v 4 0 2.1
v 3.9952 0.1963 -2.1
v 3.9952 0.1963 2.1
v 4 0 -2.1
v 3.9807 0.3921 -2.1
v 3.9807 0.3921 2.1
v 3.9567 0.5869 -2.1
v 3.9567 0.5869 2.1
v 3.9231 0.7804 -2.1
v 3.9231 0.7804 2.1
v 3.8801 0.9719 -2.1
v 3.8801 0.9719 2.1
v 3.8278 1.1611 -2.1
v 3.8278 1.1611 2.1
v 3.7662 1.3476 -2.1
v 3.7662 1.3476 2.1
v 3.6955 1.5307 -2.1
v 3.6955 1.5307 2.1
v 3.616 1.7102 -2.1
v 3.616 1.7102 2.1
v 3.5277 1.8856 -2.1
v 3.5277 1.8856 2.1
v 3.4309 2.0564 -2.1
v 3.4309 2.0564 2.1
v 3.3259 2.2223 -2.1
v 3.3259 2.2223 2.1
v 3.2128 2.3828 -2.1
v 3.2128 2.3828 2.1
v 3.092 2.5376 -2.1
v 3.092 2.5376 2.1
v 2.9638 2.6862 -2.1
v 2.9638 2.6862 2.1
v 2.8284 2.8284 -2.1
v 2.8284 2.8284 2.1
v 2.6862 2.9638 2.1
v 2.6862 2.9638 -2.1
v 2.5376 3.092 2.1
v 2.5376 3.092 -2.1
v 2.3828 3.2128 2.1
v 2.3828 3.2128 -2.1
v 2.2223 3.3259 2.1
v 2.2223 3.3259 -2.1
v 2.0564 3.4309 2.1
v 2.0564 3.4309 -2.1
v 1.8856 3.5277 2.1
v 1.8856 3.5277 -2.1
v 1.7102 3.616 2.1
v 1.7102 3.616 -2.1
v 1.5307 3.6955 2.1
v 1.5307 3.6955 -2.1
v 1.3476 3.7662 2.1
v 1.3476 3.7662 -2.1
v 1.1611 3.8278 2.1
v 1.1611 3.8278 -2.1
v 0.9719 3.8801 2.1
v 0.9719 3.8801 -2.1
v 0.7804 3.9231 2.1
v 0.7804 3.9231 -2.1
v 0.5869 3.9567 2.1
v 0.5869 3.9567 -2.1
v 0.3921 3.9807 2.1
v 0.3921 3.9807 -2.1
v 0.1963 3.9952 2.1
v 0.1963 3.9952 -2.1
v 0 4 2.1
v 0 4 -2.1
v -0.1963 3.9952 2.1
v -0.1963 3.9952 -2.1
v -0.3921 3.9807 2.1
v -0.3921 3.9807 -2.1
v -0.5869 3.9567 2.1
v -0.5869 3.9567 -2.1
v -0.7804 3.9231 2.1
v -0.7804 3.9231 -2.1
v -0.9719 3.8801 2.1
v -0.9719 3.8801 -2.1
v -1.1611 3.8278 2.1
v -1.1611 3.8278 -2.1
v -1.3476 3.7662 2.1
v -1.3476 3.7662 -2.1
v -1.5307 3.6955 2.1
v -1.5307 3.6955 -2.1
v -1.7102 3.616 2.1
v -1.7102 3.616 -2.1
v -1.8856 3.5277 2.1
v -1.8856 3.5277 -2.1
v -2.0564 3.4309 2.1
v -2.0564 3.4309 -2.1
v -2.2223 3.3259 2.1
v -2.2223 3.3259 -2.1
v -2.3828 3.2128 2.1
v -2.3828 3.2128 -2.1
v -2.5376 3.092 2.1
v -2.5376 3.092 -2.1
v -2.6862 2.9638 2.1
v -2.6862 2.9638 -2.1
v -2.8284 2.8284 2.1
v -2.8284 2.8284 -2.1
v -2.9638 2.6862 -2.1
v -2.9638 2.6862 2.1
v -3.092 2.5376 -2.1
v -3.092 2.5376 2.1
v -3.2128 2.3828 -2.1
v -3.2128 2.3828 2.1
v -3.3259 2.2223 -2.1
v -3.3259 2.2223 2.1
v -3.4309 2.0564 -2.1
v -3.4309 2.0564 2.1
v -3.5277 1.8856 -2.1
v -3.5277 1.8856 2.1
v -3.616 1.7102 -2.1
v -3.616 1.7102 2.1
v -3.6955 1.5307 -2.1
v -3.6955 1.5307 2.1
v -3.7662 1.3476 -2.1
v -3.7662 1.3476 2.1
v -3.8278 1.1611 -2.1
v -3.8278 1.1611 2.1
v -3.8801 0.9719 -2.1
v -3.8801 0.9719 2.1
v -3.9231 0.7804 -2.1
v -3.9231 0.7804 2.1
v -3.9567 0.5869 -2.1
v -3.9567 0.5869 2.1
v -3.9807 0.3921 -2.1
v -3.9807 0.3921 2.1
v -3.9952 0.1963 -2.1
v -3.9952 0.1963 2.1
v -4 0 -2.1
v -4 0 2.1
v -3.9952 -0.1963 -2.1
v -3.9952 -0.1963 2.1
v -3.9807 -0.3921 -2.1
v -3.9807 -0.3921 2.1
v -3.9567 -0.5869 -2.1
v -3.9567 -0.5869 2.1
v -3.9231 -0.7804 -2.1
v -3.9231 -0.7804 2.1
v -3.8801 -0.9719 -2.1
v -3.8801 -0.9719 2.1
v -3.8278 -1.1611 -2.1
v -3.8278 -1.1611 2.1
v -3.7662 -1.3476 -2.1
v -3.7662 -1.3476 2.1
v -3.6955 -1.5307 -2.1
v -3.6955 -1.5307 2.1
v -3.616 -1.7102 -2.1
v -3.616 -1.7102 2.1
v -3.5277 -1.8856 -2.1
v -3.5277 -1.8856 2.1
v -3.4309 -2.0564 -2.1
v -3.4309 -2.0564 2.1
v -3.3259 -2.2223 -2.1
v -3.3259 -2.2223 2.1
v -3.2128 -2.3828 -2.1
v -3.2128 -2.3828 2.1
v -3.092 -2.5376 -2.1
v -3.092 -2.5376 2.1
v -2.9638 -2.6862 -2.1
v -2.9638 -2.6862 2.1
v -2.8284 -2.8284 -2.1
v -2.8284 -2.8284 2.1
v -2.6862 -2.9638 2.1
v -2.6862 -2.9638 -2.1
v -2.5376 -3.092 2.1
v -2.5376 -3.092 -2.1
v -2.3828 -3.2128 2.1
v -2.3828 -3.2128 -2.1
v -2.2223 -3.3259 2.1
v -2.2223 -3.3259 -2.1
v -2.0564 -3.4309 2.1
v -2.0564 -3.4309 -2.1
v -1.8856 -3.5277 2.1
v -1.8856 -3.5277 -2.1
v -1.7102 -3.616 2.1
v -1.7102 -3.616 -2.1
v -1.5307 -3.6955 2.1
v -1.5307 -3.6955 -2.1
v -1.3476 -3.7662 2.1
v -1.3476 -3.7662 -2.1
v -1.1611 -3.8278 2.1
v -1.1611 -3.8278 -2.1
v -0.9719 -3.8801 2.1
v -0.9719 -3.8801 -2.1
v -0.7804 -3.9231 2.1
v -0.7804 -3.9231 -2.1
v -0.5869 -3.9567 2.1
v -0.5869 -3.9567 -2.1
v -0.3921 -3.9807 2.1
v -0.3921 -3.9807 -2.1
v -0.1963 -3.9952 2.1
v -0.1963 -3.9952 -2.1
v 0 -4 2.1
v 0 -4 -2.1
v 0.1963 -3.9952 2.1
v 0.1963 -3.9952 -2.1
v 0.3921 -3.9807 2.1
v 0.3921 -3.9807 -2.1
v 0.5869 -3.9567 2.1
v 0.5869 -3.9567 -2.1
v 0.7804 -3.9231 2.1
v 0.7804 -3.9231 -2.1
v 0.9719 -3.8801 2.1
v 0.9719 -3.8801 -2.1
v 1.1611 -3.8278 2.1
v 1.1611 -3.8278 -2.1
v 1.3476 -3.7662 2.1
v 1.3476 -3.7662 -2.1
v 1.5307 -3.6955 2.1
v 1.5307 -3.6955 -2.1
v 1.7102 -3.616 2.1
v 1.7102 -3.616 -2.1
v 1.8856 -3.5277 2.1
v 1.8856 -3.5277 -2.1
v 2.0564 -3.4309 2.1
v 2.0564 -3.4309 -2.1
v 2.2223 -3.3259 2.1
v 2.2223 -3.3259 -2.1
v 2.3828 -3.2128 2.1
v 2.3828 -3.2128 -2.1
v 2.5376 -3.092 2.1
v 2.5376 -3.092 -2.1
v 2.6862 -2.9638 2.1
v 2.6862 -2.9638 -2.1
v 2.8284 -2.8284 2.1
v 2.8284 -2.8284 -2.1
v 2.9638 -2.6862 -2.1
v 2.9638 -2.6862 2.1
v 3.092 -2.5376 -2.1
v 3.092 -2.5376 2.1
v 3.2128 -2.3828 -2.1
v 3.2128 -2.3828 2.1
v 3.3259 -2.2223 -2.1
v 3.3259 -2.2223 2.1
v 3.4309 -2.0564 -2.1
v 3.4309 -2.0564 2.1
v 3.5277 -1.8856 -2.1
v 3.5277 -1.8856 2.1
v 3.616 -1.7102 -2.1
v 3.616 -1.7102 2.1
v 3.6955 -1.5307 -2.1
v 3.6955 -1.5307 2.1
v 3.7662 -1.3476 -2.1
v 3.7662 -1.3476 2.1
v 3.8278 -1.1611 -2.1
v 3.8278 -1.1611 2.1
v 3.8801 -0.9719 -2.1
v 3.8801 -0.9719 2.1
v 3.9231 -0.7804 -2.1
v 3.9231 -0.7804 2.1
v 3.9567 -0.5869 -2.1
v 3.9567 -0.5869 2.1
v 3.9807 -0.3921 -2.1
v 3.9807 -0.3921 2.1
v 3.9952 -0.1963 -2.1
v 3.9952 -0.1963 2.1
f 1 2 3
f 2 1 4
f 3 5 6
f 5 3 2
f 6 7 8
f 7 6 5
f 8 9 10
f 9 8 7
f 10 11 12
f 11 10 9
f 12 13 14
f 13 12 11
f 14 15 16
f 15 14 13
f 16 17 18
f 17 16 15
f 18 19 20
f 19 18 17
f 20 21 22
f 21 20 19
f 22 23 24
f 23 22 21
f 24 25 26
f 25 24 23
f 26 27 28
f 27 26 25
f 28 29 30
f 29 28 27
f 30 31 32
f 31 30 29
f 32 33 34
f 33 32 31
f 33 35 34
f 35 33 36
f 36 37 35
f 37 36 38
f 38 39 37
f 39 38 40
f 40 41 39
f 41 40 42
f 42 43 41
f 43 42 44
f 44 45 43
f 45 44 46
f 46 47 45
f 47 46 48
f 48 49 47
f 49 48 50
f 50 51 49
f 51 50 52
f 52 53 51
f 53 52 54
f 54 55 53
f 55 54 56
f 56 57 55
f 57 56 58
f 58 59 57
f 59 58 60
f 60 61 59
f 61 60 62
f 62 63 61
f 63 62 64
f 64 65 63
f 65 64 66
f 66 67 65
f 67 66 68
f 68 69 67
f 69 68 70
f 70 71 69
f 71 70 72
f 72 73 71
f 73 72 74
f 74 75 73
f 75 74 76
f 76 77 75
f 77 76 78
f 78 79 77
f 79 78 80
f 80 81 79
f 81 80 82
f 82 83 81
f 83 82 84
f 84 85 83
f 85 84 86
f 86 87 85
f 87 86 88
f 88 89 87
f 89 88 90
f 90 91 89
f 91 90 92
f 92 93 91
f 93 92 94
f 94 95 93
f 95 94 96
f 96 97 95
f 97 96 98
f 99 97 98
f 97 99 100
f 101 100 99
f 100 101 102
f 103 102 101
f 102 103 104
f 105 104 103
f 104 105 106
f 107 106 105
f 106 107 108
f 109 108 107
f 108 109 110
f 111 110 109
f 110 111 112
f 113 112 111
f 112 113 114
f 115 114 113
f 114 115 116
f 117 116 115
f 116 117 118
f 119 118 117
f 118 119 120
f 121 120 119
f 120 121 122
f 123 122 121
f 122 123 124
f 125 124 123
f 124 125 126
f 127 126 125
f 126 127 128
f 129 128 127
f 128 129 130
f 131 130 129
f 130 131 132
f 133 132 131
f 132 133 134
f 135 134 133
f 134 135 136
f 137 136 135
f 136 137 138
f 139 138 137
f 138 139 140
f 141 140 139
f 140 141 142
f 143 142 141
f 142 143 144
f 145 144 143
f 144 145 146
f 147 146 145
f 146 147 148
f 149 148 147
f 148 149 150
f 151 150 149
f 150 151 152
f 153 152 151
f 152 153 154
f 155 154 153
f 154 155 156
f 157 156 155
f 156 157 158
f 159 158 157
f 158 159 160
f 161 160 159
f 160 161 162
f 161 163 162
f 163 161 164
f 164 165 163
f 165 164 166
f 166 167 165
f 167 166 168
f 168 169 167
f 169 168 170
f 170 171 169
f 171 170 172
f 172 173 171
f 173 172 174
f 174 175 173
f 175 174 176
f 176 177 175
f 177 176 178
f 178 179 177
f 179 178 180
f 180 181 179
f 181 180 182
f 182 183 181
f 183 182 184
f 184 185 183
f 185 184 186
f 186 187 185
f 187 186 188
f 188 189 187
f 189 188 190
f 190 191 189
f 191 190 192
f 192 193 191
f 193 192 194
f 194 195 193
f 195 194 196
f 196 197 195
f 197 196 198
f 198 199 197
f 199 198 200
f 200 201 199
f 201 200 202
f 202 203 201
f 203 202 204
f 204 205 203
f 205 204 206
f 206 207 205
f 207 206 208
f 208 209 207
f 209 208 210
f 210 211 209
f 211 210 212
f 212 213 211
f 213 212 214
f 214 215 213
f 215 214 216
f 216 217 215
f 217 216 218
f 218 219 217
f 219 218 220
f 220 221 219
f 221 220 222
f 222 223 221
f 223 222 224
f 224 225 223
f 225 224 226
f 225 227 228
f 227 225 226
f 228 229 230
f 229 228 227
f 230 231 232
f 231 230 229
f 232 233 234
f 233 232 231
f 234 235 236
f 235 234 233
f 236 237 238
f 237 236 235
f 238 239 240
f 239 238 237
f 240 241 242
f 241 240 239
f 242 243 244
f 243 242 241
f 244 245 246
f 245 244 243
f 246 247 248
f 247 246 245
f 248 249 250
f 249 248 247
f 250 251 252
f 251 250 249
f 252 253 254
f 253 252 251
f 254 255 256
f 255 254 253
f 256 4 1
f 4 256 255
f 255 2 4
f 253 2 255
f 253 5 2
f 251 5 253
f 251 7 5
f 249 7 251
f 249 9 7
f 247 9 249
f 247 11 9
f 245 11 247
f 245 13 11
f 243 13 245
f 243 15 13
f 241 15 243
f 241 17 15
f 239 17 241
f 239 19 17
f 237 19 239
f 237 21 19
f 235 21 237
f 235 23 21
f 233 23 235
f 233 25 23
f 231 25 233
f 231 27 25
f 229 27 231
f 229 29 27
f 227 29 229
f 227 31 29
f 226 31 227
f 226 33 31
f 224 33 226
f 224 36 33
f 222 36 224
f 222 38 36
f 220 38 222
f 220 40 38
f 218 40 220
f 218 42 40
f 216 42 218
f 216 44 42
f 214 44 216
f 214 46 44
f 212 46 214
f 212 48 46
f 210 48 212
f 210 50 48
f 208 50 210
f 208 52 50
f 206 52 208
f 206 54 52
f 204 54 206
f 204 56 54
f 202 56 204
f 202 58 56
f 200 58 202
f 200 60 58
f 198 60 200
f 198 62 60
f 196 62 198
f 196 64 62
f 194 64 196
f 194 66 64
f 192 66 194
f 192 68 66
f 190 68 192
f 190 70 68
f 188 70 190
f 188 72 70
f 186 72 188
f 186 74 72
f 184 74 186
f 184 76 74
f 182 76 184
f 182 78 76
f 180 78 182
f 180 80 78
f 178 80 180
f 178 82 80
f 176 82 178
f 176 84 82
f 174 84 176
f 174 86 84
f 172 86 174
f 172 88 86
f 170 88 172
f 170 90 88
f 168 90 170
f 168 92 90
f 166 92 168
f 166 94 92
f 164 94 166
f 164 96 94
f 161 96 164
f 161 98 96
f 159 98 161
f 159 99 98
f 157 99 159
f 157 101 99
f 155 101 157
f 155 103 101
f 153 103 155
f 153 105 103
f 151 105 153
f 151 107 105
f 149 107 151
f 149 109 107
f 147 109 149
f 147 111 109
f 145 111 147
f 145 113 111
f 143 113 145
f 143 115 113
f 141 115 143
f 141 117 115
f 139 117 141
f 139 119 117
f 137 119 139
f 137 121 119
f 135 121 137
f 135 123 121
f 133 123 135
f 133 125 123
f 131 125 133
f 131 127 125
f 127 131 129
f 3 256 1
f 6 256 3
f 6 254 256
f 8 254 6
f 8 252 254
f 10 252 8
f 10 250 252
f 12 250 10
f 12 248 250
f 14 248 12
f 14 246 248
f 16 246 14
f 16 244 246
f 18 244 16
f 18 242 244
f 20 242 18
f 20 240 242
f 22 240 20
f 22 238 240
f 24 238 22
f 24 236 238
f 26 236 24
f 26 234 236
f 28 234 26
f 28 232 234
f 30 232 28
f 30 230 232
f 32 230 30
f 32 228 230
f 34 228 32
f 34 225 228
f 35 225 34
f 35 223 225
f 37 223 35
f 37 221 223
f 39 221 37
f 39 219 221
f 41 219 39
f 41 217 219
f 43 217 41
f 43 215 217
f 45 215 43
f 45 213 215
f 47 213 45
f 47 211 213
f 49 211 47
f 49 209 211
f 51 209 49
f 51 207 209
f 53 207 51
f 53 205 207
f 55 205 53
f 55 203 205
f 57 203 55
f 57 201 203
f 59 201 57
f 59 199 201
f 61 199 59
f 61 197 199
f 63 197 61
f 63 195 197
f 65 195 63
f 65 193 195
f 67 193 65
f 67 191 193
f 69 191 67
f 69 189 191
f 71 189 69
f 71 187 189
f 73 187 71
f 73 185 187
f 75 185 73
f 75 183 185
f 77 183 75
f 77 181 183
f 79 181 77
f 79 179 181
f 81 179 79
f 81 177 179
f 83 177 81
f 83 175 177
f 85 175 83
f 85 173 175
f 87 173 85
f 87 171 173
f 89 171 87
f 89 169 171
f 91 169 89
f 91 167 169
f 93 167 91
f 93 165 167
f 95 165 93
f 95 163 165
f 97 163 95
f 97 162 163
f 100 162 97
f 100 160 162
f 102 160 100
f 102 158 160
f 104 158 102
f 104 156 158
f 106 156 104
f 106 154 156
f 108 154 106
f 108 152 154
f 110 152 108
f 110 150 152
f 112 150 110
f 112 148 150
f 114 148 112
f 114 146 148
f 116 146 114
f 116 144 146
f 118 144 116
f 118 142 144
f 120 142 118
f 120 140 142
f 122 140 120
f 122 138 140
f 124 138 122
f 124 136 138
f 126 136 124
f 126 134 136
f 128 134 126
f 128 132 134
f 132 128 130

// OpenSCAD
// Permanent magnet: 8.0mm diameter, 4.2mm tall

outer_diameter_mm = 8.0;   // [4.0:16.0:0.1]
height_mm         = 4.2;   // [2.1:8.4:0.1]

outer_radius_mm = outer_diameter_mm / 2;

$fn = 128;

module magnet(d=outer_diameter_mm, h=height_mm) {
    assert(d > 0);
    assert(h > 0);

    color([0.72, 0.45, 0.2])
        cylinder(d=d, h=h, center=true);
}

magnet();
